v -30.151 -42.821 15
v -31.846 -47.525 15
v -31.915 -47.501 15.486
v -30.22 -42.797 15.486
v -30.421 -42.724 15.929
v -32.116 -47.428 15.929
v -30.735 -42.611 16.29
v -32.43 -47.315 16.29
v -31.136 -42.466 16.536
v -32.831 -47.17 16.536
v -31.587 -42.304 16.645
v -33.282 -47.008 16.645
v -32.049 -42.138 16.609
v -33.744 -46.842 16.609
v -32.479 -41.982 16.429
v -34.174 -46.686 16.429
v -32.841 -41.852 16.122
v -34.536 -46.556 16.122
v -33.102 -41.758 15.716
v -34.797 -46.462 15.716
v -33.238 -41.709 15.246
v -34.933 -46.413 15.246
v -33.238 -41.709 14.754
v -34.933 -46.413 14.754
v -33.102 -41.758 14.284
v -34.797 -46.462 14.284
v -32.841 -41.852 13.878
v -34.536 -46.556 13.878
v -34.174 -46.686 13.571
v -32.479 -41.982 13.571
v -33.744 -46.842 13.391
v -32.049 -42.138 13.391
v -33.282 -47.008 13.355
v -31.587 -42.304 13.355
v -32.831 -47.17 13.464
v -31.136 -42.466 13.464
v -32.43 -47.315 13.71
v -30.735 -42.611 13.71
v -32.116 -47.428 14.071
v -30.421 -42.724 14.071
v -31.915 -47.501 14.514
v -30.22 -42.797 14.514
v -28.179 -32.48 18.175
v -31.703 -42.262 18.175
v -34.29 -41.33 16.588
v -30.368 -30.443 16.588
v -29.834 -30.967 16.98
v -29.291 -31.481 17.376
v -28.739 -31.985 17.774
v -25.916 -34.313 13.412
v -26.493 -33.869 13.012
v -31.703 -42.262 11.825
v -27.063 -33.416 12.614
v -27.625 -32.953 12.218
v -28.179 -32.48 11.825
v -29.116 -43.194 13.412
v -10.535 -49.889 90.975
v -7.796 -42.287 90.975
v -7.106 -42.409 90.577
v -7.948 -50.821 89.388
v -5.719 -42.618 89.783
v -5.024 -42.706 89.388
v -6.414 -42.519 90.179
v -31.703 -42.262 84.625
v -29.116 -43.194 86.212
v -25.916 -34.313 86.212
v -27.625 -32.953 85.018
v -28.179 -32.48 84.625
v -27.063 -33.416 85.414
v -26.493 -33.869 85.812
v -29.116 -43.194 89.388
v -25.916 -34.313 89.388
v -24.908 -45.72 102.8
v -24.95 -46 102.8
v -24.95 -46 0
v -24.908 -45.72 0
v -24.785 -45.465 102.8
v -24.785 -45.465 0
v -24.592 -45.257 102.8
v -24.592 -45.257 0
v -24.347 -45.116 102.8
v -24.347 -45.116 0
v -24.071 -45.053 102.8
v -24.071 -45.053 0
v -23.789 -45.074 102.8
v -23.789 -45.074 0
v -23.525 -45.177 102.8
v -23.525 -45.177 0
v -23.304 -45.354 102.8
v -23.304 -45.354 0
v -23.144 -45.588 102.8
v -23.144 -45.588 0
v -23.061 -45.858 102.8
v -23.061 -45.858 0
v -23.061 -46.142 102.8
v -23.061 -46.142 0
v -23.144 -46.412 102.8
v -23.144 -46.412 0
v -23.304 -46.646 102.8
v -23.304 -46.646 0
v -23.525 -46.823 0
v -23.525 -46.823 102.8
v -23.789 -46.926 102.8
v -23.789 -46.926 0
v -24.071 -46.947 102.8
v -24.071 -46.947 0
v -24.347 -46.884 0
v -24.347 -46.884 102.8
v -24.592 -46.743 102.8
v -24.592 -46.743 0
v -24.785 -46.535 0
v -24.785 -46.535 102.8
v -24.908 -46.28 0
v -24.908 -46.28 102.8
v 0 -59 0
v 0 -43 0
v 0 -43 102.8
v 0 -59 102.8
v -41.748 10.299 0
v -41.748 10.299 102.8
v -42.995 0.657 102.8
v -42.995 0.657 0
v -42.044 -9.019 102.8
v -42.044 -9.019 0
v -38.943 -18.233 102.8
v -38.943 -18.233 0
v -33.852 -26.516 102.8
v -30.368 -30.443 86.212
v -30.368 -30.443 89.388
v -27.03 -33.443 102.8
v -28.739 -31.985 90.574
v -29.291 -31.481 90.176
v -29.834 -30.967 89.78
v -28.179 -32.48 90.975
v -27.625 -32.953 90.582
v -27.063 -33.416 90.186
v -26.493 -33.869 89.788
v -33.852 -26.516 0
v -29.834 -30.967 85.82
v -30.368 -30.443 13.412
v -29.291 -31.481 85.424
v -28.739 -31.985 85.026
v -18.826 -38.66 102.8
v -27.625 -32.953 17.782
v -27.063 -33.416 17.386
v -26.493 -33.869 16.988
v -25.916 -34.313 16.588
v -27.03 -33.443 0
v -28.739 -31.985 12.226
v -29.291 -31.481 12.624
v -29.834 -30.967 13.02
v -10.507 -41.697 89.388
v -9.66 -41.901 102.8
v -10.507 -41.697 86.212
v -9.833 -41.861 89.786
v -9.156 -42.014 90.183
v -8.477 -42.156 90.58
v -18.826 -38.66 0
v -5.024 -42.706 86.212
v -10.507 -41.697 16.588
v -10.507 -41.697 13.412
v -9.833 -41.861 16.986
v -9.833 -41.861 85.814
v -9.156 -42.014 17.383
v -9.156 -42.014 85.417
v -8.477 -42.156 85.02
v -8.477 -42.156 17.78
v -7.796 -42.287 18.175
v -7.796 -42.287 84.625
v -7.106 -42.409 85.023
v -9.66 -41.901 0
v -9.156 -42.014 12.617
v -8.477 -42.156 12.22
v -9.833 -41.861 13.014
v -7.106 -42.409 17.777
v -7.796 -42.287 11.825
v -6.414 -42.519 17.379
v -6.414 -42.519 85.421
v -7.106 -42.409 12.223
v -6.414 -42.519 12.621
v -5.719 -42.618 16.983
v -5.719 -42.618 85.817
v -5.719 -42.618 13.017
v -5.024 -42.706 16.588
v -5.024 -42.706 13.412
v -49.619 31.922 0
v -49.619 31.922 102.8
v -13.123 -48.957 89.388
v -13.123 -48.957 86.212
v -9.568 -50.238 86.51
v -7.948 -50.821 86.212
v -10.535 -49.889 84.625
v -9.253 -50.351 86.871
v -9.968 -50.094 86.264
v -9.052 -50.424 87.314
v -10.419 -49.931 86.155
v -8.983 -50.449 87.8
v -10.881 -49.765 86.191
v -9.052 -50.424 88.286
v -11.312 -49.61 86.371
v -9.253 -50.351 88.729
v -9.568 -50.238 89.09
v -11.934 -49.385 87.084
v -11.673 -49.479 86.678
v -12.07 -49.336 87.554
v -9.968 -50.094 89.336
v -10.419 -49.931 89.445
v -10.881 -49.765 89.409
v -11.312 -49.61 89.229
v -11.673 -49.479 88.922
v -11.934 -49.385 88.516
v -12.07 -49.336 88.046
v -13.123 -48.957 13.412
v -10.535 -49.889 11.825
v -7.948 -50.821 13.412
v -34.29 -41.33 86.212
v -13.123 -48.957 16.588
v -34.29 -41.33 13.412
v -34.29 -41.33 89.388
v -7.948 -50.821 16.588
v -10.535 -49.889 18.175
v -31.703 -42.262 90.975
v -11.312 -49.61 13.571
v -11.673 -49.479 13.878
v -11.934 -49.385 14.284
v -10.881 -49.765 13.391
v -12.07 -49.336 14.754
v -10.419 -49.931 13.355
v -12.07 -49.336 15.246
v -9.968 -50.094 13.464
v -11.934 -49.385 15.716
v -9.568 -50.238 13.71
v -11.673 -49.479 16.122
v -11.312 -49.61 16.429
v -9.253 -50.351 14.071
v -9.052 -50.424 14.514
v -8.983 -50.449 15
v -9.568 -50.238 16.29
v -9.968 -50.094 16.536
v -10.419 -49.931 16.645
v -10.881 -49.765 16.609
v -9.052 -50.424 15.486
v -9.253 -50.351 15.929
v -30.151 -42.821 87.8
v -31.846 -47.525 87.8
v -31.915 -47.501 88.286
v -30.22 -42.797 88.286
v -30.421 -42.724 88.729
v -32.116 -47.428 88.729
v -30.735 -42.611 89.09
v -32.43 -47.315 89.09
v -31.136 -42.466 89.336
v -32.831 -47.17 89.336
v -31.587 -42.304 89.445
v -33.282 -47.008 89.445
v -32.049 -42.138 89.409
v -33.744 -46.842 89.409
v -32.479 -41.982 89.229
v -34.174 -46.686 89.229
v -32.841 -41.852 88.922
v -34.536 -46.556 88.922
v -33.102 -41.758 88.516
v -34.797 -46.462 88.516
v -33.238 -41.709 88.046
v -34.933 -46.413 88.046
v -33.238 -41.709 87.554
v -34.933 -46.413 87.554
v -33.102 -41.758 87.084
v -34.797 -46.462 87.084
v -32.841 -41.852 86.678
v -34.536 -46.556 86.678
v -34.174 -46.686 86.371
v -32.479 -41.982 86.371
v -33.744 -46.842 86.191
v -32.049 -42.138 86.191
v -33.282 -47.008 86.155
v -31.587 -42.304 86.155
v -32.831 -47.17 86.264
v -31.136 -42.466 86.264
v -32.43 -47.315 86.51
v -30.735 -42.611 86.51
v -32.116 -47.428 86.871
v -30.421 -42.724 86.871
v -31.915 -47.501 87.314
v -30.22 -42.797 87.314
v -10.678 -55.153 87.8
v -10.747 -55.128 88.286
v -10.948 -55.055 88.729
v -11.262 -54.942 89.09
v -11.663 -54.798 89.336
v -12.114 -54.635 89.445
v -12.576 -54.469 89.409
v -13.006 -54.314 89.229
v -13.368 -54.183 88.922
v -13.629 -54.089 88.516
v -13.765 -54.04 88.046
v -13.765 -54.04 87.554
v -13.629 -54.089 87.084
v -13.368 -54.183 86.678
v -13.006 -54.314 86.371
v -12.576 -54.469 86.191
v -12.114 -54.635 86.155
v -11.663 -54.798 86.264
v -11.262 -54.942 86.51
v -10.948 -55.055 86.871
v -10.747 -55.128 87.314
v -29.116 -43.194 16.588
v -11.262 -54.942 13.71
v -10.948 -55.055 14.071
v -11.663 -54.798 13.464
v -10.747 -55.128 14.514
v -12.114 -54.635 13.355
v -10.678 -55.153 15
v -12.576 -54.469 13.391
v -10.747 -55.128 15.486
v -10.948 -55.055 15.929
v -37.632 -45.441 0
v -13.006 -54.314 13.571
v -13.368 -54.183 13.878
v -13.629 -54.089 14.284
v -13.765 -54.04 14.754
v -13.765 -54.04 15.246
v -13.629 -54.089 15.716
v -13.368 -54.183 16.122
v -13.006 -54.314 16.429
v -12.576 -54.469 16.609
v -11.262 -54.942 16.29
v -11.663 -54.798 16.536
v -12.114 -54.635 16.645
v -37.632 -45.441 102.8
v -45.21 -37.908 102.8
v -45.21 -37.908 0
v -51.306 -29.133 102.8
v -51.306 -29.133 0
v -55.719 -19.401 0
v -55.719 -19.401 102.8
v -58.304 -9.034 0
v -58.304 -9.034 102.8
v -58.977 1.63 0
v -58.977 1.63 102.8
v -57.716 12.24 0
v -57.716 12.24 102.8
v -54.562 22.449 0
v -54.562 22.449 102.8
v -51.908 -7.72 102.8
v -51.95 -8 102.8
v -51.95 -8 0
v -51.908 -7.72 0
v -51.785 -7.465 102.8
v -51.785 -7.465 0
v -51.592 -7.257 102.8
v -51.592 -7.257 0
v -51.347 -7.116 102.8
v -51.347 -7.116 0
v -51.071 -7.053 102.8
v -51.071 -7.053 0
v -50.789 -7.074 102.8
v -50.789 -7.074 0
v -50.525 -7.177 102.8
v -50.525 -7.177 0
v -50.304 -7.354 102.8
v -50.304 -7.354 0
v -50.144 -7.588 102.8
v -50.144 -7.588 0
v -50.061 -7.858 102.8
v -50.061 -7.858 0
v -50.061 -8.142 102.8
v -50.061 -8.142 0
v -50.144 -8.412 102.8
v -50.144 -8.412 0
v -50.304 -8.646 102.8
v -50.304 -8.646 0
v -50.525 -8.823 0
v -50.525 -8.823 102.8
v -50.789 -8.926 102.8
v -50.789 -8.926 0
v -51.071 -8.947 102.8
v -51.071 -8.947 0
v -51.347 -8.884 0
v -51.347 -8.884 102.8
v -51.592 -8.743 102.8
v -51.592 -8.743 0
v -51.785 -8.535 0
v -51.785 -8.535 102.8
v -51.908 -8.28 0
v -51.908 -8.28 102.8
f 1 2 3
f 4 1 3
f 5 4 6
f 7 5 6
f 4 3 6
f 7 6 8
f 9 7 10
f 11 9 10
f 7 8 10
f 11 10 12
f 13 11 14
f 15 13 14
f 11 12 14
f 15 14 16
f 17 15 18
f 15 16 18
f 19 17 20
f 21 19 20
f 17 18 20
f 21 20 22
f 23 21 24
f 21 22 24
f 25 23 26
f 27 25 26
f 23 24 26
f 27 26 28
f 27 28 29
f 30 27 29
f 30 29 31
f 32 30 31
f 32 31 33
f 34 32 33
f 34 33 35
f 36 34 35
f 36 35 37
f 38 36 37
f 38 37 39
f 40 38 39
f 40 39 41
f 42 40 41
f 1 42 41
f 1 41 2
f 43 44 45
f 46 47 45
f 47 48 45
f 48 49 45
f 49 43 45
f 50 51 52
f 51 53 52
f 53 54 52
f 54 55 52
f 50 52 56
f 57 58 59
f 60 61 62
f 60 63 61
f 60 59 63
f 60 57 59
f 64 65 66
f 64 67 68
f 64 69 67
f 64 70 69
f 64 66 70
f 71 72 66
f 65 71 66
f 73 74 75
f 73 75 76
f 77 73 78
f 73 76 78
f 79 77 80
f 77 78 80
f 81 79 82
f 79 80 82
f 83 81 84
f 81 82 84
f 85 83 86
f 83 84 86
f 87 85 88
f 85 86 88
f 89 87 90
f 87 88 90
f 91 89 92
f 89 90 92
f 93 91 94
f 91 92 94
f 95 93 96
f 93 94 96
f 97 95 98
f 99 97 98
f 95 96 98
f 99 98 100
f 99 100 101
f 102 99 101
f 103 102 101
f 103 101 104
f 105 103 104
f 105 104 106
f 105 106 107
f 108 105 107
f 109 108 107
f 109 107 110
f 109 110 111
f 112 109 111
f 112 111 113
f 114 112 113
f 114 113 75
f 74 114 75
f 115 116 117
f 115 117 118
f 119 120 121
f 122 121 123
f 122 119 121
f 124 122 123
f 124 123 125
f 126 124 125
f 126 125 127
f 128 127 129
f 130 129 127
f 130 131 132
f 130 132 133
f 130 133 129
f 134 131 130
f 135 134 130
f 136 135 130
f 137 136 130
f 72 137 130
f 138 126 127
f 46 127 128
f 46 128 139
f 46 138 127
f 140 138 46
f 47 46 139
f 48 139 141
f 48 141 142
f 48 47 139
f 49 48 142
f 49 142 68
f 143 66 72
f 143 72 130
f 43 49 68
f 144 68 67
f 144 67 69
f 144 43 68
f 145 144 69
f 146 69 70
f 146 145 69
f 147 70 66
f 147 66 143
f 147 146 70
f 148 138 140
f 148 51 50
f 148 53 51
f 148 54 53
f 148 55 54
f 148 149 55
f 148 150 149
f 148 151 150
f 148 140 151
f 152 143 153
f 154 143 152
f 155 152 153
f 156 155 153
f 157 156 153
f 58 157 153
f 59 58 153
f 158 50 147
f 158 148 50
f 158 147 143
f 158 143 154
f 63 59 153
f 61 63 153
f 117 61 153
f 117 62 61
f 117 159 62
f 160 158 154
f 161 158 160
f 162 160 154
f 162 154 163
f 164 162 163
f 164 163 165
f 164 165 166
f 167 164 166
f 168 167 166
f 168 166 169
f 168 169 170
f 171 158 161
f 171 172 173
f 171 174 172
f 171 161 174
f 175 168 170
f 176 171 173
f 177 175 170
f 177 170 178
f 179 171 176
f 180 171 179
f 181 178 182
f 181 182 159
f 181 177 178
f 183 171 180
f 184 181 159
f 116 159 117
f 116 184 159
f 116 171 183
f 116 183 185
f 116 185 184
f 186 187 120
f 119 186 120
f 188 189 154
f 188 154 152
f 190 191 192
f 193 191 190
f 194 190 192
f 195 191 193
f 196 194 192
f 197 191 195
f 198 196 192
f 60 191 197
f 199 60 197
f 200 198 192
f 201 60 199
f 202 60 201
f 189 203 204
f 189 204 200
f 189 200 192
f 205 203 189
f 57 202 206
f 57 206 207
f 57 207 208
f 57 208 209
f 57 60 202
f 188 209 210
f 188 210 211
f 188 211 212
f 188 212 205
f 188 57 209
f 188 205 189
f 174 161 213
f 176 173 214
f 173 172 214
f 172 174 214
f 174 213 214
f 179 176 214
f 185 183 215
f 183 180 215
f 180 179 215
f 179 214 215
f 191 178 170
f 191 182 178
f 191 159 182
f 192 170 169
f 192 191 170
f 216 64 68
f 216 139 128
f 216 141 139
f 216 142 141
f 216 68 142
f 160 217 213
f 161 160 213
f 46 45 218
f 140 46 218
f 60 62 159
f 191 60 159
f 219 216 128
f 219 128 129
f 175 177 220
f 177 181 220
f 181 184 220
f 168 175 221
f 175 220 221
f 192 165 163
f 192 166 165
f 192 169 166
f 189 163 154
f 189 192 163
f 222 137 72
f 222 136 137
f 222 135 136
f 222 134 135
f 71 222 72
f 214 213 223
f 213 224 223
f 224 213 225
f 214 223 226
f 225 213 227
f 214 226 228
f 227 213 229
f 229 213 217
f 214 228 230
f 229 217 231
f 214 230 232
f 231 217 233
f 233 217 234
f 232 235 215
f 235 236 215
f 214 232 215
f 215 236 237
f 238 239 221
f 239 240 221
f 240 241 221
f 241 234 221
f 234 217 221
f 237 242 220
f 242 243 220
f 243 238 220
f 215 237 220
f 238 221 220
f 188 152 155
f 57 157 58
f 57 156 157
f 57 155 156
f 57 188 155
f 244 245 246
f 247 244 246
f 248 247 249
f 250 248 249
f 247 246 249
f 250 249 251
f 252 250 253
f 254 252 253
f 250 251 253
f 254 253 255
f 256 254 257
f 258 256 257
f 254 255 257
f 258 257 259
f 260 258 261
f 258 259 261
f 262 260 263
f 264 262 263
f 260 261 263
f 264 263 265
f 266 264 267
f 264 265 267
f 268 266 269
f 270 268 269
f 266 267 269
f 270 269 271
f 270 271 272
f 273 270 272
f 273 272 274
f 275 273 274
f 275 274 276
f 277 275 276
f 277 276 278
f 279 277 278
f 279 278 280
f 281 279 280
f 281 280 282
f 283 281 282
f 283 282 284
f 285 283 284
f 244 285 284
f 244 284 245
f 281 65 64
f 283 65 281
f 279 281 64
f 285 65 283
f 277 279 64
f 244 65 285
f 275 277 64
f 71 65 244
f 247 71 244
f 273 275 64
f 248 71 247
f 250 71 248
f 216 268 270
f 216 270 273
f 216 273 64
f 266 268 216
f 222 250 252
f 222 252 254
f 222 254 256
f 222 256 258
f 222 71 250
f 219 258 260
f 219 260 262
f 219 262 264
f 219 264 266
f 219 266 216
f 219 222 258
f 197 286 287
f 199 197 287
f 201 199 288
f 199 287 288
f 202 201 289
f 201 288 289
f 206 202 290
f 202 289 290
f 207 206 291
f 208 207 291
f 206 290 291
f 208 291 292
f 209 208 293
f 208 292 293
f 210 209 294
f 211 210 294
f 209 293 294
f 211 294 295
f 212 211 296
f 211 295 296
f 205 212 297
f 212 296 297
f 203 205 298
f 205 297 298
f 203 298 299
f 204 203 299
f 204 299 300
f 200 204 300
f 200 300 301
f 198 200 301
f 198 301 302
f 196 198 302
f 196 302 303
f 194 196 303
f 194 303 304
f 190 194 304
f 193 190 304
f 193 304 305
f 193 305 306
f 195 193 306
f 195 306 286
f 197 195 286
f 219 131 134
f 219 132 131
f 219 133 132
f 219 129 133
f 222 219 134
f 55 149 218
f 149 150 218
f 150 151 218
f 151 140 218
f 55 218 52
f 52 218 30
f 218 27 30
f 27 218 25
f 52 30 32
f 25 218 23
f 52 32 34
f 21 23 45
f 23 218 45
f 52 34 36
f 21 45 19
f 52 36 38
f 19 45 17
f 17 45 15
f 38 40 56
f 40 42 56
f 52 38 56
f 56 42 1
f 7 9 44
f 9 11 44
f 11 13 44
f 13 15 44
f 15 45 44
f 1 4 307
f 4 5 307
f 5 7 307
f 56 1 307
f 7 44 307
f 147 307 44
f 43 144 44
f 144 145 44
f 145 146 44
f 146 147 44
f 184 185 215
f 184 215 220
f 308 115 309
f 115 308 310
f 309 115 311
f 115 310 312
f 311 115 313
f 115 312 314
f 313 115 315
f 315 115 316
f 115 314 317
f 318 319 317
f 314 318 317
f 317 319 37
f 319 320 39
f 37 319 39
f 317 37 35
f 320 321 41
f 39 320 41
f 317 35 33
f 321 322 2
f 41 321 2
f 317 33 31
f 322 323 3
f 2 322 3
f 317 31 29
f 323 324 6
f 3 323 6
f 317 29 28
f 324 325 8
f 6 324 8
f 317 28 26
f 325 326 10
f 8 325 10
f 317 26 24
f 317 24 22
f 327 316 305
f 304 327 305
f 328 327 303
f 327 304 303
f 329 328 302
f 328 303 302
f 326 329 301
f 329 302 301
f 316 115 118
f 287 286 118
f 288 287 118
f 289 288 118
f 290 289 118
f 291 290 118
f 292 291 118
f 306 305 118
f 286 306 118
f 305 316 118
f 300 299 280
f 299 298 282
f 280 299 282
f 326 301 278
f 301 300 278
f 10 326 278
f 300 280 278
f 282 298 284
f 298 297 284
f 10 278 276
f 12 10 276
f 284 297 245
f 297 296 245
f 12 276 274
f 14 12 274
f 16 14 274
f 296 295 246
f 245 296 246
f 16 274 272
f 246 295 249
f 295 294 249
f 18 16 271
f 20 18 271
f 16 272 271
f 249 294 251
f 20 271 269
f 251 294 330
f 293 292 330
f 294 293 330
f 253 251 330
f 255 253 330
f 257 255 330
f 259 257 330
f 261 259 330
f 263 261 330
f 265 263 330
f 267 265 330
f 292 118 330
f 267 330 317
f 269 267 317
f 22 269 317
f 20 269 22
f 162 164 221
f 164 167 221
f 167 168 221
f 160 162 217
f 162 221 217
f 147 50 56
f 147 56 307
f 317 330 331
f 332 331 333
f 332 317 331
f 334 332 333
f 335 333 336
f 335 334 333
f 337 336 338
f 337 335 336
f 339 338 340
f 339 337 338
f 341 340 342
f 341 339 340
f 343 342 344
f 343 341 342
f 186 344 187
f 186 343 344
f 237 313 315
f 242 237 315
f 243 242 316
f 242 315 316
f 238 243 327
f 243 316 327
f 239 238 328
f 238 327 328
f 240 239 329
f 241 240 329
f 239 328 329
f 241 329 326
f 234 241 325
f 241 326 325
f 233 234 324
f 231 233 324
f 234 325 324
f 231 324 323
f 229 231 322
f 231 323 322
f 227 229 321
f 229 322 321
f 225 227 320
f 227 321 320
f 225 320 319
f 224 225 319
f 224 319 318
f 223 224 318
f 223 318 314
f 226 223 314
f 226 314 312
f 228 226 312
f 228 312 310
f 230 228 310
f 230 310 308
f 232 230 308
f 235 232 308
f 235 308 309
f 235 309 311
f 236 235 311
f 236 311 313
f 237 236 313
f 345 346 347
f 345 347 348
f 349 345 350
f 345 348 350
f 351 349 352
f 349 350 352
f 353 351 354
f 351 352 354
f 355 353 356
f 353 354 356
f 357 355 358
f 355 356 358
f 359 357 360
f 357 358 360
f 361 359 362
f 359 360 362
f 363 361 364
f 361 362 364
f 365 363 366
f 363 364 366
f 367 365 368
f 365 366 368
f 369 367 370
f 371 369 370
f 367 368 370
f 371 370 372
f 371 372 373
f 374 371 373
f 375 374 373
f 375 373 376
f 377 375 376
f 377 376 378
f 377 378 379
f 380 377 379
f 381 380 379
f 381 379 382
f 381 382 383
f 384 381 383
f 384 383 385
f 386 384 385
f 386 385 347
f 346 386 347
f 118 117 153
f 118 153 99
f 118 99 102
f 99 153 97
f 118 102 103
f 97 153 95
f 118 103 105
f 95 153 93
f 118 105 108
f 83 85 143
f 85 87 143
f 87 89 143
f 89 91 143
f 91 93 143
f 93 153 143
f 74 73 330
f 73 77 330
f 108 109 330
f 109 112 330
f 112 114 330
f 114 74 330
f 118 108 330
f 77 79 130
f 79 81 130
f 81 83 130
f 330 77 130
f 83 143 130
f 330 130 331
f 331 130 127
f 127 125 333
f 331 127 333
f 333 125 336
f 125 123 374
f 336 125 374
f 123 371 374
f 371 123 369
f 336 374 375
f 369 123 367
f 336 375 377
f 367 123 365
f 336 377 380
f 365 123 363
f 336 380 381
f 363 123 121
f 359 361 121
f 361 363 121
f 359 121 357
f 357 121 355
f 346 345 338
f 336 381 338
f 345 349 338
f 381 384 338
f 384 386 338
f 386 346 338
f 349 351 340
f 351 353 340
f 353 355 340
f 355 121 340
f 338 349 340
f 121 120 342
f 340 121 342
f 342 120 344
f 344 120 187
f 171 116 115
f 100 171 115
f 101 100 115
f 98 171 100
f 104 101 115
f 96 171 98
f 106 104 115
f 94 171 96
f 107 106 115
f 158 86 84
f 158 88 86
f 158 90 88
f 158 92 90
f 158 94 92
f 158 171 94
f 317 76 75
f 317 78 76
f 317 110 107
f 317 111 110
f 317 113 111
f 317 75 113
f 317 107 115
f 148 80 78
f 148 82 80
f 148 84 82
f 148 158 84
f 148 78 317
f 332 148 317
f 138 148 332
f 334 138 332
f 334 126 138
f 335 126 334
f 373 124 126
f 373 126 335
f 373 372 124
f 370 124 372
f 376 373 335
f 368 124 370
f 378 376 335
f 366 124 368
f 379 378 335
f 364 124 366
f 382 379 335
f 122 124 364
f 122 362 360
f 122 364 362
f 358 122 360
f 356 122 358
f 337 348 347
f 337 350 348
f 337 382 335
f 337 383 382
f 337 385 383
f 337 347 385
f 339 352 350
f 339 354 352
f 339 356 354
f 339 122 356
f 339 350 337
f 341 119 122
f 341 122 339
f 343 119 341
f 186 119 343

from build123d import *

# Parameters (mm, degrees)
BOSS_EXTRUDE1_DEPTH = 102.8
CUT_EXTRUDE1_DEPTH  = 103.8
CUT_EXTRUDE2_DEPTH  = 103.8
CUT_EXTRUDE3_REACH  = 87.538
SKETCH5_R           = 1.65
CUT_EXTRUDE4_START  = -5
CUT_EXTRUDE4_DEPTH  = 81.538495947
SKETCH7_R           = 0.95
CUT_EXTRUDE5_DEPTH  = 103.8


with BuildPart() as part:
    # Sketch1 → Boss-Extrude1 (new body)
    with BuildSketch(Plane.XY):
        with BuildLine():
            Line((0, 59), (0, 43))
            ThreePointArc((0, 43), (-43, 0), (0, -43))
            Line((0, -43), (0, -59))
            ThreePointArc((0, -59), (-59, 0), (0, 59))
        make_face()
    extrude(amount=BOSS_EXTRUDE1_DEPTH)

    # Sketch3 → Cut-Extrude1 (cut, through all)
    with BuildSketch(Plane.XY.offset(102.8)):
        Polygon((0, 0), (0, 90), (-70.757321084, 90), (-38, 0), align=None)
    extrude(amount=-CUT_EXTRUDE1_DEPTH, mode=Mode.SUBTRACT)

    # Sketch4 → Cut-Extrude2 (cut, through all)
    with BuildSketch(Plane.XY.offset(102.8)):
        Polygon((0, -59), (-37.631699217, -45.440677966), (-42.517346633, -59), align=None)
    extrude(amount=-CUT_EXTRUDE2_DEPTH, mode=Mode.SUBTRACT)

    # Sketch5 → Cut-Extrude3 (cut, up to next)
    with BuildSketch(Plane(origin=(-18.815849609, -52.220338983, 0), x_dir=(0.94079248, -0.338983051, 0), z_dir=(-0.338983051, -0.94079248, 0)), mode=Mode.PRIVATE) as cut_extrude3_sk1:
        with Locations((7, 15)):
            Circle(SKETCH5_R)
    cut_extrude3_tool1 = extrude(cut_extrude3_sk1.sketch, amount=-CUT_EXTRUDE3_REACH, mode=Mode.PRIVATE) & part.part
    add(cut_extrude3_tool1.solids().sort_by_distance((-12.230302, -54.59322, 15))[0], mode=Mode.SUBTRACT)
    # Sketch5 → Cut-Extrude3 (cut, up to next)
    with BuildSketch(Plane(origin=(-18.815849609, -52.220338983, 0), x_dir=(0.94079248, -0.338983051, 0), z_dir=(-0.338983051, -0.94079248, 0)), mode=Mode.PRIVATE) as cut_extrude3_sk2:
        with Locations((-15.5, 15)):
            Circle(SKETCH5_R)
    cut_extrude3_tool2 = extrude(cut_extrude3_sk2.sketch, amount=-CUT_EXTRUDE3_REACH, mode=Mode.PRIVATE) & part.part
    add(cut_extrude3_tool2.solids().sort_by_distance((-33.398133, -46.966102, 15))[0], mode=Mode.SUBTRACT)
    # Sketch5 → Cut-Extrude3 (cut, up to next)
    with BuildSketch(Plane(origin=(-18.815849609, -52.220338983, 0), x_dir=(0.94079248, -0.338983051, 0), z_dir=(-0.338983051, -0.94079248, 0)), mode=Mode.PRIVATE) as cut_extrude3_sk3:
        with Locations((-15.5, 87.8)):
            Circle(SKETCH5_R)
    cut_extrude3_tool3 = extrude(cut_extrude3_sk3.sketch, amount=-CUT_EXTRUDE3_REACH, mode=Mode.PRIVATE) & part.part
    add(cut_extrude3_tool3.solids().sort_by_distance((-33.398133, -46.966102, 87.8))[0], mode=Mode.SUBTRACT)
    # Sketch5 → Cut-Extrude3 (cut, up to next)
    with BuildSketch(Plane(origin=(-18.815849609, -52.220338983, 0), x_dir=(0.94079248, -0.338983051, 0), z_dir=(-0.338983051, -0.94079248, 0)), mode=Mode.PRIVATE) as cut_extrude3_sk4:
        with Locations((7, 87.8)):
            Circle(SKETCH5_R)
    cut_extrude3_tool4 = extrude(cut_extrude3_sk4.sketch, amount=-CUT_EXTRUDE3_REACH, mode=Mode.PRIVATE) & part.part
    add(cut_extrude3_tool4.solids().sort_by_distance((-12.230302, -54.59322, 87.8))[0], mode=Mode.SUBTRACT)

    # Sketch6 → Cut-Extrude4 (cut, through all)
    with BuildSketch(Plane(origin=(-18.815849609, -52.220338983, 0), x_dir=(0.94079248, -0.338983051, 0), z_dir=(-0.338983051, -0.94079248, 0)).offset(CUT_EXTRUDE4_START)):
        Polygon((7, 11.824573519), (9.75, 13.41228676), (9.75, 16.58771324), (7, 18.175426481), (4.25, 16.58771324), (4.25, 13.41228676), align=None)
        Polygon((-15.5, 11.824573519), (-12.75, 13.41228676), (-12.75, 16.58771324), (-15.5, 18.175426481), (-18.25, 16.58771324), (-18.25, 13.41228676), align=None)
        Polygon((-18.25, 89.38771324), (-15.5, 90.975426481), (-12.75, 89.38771324), (-12.75, 86.21228676), (-15.5, 84.624573519), (-18.25, 86.21228676), align=None)
        Polygon((4.25, 89.38771324), (7, 90.975426481), (9.75, 89.38771324), (9.75, 86.21228676), (7, 84.624573519), (4.25, 86.21228676), align=None)
    extrude(amount=-CUT_EXTRUDE4_DEPTH, mode=Mode.SUBTRACT)

    # Sketch7 → Cut-Extrude5 (cut, through all)
    with BuildSketch(Plane(origin=(0, 0, 0), x_dir=(-1, 0, 0), z_dir=(0, 0, -1))):
        with Locations((24, -46)):
            Circle(SKETCH7_R)
        with Locations((51, -8)):
            Circle(SKETCH7_R)
    extrude(amount=-CUT_EXTRUDE5_DEPTH, mode=Mode.SUBTRACT)


solid = part.part
